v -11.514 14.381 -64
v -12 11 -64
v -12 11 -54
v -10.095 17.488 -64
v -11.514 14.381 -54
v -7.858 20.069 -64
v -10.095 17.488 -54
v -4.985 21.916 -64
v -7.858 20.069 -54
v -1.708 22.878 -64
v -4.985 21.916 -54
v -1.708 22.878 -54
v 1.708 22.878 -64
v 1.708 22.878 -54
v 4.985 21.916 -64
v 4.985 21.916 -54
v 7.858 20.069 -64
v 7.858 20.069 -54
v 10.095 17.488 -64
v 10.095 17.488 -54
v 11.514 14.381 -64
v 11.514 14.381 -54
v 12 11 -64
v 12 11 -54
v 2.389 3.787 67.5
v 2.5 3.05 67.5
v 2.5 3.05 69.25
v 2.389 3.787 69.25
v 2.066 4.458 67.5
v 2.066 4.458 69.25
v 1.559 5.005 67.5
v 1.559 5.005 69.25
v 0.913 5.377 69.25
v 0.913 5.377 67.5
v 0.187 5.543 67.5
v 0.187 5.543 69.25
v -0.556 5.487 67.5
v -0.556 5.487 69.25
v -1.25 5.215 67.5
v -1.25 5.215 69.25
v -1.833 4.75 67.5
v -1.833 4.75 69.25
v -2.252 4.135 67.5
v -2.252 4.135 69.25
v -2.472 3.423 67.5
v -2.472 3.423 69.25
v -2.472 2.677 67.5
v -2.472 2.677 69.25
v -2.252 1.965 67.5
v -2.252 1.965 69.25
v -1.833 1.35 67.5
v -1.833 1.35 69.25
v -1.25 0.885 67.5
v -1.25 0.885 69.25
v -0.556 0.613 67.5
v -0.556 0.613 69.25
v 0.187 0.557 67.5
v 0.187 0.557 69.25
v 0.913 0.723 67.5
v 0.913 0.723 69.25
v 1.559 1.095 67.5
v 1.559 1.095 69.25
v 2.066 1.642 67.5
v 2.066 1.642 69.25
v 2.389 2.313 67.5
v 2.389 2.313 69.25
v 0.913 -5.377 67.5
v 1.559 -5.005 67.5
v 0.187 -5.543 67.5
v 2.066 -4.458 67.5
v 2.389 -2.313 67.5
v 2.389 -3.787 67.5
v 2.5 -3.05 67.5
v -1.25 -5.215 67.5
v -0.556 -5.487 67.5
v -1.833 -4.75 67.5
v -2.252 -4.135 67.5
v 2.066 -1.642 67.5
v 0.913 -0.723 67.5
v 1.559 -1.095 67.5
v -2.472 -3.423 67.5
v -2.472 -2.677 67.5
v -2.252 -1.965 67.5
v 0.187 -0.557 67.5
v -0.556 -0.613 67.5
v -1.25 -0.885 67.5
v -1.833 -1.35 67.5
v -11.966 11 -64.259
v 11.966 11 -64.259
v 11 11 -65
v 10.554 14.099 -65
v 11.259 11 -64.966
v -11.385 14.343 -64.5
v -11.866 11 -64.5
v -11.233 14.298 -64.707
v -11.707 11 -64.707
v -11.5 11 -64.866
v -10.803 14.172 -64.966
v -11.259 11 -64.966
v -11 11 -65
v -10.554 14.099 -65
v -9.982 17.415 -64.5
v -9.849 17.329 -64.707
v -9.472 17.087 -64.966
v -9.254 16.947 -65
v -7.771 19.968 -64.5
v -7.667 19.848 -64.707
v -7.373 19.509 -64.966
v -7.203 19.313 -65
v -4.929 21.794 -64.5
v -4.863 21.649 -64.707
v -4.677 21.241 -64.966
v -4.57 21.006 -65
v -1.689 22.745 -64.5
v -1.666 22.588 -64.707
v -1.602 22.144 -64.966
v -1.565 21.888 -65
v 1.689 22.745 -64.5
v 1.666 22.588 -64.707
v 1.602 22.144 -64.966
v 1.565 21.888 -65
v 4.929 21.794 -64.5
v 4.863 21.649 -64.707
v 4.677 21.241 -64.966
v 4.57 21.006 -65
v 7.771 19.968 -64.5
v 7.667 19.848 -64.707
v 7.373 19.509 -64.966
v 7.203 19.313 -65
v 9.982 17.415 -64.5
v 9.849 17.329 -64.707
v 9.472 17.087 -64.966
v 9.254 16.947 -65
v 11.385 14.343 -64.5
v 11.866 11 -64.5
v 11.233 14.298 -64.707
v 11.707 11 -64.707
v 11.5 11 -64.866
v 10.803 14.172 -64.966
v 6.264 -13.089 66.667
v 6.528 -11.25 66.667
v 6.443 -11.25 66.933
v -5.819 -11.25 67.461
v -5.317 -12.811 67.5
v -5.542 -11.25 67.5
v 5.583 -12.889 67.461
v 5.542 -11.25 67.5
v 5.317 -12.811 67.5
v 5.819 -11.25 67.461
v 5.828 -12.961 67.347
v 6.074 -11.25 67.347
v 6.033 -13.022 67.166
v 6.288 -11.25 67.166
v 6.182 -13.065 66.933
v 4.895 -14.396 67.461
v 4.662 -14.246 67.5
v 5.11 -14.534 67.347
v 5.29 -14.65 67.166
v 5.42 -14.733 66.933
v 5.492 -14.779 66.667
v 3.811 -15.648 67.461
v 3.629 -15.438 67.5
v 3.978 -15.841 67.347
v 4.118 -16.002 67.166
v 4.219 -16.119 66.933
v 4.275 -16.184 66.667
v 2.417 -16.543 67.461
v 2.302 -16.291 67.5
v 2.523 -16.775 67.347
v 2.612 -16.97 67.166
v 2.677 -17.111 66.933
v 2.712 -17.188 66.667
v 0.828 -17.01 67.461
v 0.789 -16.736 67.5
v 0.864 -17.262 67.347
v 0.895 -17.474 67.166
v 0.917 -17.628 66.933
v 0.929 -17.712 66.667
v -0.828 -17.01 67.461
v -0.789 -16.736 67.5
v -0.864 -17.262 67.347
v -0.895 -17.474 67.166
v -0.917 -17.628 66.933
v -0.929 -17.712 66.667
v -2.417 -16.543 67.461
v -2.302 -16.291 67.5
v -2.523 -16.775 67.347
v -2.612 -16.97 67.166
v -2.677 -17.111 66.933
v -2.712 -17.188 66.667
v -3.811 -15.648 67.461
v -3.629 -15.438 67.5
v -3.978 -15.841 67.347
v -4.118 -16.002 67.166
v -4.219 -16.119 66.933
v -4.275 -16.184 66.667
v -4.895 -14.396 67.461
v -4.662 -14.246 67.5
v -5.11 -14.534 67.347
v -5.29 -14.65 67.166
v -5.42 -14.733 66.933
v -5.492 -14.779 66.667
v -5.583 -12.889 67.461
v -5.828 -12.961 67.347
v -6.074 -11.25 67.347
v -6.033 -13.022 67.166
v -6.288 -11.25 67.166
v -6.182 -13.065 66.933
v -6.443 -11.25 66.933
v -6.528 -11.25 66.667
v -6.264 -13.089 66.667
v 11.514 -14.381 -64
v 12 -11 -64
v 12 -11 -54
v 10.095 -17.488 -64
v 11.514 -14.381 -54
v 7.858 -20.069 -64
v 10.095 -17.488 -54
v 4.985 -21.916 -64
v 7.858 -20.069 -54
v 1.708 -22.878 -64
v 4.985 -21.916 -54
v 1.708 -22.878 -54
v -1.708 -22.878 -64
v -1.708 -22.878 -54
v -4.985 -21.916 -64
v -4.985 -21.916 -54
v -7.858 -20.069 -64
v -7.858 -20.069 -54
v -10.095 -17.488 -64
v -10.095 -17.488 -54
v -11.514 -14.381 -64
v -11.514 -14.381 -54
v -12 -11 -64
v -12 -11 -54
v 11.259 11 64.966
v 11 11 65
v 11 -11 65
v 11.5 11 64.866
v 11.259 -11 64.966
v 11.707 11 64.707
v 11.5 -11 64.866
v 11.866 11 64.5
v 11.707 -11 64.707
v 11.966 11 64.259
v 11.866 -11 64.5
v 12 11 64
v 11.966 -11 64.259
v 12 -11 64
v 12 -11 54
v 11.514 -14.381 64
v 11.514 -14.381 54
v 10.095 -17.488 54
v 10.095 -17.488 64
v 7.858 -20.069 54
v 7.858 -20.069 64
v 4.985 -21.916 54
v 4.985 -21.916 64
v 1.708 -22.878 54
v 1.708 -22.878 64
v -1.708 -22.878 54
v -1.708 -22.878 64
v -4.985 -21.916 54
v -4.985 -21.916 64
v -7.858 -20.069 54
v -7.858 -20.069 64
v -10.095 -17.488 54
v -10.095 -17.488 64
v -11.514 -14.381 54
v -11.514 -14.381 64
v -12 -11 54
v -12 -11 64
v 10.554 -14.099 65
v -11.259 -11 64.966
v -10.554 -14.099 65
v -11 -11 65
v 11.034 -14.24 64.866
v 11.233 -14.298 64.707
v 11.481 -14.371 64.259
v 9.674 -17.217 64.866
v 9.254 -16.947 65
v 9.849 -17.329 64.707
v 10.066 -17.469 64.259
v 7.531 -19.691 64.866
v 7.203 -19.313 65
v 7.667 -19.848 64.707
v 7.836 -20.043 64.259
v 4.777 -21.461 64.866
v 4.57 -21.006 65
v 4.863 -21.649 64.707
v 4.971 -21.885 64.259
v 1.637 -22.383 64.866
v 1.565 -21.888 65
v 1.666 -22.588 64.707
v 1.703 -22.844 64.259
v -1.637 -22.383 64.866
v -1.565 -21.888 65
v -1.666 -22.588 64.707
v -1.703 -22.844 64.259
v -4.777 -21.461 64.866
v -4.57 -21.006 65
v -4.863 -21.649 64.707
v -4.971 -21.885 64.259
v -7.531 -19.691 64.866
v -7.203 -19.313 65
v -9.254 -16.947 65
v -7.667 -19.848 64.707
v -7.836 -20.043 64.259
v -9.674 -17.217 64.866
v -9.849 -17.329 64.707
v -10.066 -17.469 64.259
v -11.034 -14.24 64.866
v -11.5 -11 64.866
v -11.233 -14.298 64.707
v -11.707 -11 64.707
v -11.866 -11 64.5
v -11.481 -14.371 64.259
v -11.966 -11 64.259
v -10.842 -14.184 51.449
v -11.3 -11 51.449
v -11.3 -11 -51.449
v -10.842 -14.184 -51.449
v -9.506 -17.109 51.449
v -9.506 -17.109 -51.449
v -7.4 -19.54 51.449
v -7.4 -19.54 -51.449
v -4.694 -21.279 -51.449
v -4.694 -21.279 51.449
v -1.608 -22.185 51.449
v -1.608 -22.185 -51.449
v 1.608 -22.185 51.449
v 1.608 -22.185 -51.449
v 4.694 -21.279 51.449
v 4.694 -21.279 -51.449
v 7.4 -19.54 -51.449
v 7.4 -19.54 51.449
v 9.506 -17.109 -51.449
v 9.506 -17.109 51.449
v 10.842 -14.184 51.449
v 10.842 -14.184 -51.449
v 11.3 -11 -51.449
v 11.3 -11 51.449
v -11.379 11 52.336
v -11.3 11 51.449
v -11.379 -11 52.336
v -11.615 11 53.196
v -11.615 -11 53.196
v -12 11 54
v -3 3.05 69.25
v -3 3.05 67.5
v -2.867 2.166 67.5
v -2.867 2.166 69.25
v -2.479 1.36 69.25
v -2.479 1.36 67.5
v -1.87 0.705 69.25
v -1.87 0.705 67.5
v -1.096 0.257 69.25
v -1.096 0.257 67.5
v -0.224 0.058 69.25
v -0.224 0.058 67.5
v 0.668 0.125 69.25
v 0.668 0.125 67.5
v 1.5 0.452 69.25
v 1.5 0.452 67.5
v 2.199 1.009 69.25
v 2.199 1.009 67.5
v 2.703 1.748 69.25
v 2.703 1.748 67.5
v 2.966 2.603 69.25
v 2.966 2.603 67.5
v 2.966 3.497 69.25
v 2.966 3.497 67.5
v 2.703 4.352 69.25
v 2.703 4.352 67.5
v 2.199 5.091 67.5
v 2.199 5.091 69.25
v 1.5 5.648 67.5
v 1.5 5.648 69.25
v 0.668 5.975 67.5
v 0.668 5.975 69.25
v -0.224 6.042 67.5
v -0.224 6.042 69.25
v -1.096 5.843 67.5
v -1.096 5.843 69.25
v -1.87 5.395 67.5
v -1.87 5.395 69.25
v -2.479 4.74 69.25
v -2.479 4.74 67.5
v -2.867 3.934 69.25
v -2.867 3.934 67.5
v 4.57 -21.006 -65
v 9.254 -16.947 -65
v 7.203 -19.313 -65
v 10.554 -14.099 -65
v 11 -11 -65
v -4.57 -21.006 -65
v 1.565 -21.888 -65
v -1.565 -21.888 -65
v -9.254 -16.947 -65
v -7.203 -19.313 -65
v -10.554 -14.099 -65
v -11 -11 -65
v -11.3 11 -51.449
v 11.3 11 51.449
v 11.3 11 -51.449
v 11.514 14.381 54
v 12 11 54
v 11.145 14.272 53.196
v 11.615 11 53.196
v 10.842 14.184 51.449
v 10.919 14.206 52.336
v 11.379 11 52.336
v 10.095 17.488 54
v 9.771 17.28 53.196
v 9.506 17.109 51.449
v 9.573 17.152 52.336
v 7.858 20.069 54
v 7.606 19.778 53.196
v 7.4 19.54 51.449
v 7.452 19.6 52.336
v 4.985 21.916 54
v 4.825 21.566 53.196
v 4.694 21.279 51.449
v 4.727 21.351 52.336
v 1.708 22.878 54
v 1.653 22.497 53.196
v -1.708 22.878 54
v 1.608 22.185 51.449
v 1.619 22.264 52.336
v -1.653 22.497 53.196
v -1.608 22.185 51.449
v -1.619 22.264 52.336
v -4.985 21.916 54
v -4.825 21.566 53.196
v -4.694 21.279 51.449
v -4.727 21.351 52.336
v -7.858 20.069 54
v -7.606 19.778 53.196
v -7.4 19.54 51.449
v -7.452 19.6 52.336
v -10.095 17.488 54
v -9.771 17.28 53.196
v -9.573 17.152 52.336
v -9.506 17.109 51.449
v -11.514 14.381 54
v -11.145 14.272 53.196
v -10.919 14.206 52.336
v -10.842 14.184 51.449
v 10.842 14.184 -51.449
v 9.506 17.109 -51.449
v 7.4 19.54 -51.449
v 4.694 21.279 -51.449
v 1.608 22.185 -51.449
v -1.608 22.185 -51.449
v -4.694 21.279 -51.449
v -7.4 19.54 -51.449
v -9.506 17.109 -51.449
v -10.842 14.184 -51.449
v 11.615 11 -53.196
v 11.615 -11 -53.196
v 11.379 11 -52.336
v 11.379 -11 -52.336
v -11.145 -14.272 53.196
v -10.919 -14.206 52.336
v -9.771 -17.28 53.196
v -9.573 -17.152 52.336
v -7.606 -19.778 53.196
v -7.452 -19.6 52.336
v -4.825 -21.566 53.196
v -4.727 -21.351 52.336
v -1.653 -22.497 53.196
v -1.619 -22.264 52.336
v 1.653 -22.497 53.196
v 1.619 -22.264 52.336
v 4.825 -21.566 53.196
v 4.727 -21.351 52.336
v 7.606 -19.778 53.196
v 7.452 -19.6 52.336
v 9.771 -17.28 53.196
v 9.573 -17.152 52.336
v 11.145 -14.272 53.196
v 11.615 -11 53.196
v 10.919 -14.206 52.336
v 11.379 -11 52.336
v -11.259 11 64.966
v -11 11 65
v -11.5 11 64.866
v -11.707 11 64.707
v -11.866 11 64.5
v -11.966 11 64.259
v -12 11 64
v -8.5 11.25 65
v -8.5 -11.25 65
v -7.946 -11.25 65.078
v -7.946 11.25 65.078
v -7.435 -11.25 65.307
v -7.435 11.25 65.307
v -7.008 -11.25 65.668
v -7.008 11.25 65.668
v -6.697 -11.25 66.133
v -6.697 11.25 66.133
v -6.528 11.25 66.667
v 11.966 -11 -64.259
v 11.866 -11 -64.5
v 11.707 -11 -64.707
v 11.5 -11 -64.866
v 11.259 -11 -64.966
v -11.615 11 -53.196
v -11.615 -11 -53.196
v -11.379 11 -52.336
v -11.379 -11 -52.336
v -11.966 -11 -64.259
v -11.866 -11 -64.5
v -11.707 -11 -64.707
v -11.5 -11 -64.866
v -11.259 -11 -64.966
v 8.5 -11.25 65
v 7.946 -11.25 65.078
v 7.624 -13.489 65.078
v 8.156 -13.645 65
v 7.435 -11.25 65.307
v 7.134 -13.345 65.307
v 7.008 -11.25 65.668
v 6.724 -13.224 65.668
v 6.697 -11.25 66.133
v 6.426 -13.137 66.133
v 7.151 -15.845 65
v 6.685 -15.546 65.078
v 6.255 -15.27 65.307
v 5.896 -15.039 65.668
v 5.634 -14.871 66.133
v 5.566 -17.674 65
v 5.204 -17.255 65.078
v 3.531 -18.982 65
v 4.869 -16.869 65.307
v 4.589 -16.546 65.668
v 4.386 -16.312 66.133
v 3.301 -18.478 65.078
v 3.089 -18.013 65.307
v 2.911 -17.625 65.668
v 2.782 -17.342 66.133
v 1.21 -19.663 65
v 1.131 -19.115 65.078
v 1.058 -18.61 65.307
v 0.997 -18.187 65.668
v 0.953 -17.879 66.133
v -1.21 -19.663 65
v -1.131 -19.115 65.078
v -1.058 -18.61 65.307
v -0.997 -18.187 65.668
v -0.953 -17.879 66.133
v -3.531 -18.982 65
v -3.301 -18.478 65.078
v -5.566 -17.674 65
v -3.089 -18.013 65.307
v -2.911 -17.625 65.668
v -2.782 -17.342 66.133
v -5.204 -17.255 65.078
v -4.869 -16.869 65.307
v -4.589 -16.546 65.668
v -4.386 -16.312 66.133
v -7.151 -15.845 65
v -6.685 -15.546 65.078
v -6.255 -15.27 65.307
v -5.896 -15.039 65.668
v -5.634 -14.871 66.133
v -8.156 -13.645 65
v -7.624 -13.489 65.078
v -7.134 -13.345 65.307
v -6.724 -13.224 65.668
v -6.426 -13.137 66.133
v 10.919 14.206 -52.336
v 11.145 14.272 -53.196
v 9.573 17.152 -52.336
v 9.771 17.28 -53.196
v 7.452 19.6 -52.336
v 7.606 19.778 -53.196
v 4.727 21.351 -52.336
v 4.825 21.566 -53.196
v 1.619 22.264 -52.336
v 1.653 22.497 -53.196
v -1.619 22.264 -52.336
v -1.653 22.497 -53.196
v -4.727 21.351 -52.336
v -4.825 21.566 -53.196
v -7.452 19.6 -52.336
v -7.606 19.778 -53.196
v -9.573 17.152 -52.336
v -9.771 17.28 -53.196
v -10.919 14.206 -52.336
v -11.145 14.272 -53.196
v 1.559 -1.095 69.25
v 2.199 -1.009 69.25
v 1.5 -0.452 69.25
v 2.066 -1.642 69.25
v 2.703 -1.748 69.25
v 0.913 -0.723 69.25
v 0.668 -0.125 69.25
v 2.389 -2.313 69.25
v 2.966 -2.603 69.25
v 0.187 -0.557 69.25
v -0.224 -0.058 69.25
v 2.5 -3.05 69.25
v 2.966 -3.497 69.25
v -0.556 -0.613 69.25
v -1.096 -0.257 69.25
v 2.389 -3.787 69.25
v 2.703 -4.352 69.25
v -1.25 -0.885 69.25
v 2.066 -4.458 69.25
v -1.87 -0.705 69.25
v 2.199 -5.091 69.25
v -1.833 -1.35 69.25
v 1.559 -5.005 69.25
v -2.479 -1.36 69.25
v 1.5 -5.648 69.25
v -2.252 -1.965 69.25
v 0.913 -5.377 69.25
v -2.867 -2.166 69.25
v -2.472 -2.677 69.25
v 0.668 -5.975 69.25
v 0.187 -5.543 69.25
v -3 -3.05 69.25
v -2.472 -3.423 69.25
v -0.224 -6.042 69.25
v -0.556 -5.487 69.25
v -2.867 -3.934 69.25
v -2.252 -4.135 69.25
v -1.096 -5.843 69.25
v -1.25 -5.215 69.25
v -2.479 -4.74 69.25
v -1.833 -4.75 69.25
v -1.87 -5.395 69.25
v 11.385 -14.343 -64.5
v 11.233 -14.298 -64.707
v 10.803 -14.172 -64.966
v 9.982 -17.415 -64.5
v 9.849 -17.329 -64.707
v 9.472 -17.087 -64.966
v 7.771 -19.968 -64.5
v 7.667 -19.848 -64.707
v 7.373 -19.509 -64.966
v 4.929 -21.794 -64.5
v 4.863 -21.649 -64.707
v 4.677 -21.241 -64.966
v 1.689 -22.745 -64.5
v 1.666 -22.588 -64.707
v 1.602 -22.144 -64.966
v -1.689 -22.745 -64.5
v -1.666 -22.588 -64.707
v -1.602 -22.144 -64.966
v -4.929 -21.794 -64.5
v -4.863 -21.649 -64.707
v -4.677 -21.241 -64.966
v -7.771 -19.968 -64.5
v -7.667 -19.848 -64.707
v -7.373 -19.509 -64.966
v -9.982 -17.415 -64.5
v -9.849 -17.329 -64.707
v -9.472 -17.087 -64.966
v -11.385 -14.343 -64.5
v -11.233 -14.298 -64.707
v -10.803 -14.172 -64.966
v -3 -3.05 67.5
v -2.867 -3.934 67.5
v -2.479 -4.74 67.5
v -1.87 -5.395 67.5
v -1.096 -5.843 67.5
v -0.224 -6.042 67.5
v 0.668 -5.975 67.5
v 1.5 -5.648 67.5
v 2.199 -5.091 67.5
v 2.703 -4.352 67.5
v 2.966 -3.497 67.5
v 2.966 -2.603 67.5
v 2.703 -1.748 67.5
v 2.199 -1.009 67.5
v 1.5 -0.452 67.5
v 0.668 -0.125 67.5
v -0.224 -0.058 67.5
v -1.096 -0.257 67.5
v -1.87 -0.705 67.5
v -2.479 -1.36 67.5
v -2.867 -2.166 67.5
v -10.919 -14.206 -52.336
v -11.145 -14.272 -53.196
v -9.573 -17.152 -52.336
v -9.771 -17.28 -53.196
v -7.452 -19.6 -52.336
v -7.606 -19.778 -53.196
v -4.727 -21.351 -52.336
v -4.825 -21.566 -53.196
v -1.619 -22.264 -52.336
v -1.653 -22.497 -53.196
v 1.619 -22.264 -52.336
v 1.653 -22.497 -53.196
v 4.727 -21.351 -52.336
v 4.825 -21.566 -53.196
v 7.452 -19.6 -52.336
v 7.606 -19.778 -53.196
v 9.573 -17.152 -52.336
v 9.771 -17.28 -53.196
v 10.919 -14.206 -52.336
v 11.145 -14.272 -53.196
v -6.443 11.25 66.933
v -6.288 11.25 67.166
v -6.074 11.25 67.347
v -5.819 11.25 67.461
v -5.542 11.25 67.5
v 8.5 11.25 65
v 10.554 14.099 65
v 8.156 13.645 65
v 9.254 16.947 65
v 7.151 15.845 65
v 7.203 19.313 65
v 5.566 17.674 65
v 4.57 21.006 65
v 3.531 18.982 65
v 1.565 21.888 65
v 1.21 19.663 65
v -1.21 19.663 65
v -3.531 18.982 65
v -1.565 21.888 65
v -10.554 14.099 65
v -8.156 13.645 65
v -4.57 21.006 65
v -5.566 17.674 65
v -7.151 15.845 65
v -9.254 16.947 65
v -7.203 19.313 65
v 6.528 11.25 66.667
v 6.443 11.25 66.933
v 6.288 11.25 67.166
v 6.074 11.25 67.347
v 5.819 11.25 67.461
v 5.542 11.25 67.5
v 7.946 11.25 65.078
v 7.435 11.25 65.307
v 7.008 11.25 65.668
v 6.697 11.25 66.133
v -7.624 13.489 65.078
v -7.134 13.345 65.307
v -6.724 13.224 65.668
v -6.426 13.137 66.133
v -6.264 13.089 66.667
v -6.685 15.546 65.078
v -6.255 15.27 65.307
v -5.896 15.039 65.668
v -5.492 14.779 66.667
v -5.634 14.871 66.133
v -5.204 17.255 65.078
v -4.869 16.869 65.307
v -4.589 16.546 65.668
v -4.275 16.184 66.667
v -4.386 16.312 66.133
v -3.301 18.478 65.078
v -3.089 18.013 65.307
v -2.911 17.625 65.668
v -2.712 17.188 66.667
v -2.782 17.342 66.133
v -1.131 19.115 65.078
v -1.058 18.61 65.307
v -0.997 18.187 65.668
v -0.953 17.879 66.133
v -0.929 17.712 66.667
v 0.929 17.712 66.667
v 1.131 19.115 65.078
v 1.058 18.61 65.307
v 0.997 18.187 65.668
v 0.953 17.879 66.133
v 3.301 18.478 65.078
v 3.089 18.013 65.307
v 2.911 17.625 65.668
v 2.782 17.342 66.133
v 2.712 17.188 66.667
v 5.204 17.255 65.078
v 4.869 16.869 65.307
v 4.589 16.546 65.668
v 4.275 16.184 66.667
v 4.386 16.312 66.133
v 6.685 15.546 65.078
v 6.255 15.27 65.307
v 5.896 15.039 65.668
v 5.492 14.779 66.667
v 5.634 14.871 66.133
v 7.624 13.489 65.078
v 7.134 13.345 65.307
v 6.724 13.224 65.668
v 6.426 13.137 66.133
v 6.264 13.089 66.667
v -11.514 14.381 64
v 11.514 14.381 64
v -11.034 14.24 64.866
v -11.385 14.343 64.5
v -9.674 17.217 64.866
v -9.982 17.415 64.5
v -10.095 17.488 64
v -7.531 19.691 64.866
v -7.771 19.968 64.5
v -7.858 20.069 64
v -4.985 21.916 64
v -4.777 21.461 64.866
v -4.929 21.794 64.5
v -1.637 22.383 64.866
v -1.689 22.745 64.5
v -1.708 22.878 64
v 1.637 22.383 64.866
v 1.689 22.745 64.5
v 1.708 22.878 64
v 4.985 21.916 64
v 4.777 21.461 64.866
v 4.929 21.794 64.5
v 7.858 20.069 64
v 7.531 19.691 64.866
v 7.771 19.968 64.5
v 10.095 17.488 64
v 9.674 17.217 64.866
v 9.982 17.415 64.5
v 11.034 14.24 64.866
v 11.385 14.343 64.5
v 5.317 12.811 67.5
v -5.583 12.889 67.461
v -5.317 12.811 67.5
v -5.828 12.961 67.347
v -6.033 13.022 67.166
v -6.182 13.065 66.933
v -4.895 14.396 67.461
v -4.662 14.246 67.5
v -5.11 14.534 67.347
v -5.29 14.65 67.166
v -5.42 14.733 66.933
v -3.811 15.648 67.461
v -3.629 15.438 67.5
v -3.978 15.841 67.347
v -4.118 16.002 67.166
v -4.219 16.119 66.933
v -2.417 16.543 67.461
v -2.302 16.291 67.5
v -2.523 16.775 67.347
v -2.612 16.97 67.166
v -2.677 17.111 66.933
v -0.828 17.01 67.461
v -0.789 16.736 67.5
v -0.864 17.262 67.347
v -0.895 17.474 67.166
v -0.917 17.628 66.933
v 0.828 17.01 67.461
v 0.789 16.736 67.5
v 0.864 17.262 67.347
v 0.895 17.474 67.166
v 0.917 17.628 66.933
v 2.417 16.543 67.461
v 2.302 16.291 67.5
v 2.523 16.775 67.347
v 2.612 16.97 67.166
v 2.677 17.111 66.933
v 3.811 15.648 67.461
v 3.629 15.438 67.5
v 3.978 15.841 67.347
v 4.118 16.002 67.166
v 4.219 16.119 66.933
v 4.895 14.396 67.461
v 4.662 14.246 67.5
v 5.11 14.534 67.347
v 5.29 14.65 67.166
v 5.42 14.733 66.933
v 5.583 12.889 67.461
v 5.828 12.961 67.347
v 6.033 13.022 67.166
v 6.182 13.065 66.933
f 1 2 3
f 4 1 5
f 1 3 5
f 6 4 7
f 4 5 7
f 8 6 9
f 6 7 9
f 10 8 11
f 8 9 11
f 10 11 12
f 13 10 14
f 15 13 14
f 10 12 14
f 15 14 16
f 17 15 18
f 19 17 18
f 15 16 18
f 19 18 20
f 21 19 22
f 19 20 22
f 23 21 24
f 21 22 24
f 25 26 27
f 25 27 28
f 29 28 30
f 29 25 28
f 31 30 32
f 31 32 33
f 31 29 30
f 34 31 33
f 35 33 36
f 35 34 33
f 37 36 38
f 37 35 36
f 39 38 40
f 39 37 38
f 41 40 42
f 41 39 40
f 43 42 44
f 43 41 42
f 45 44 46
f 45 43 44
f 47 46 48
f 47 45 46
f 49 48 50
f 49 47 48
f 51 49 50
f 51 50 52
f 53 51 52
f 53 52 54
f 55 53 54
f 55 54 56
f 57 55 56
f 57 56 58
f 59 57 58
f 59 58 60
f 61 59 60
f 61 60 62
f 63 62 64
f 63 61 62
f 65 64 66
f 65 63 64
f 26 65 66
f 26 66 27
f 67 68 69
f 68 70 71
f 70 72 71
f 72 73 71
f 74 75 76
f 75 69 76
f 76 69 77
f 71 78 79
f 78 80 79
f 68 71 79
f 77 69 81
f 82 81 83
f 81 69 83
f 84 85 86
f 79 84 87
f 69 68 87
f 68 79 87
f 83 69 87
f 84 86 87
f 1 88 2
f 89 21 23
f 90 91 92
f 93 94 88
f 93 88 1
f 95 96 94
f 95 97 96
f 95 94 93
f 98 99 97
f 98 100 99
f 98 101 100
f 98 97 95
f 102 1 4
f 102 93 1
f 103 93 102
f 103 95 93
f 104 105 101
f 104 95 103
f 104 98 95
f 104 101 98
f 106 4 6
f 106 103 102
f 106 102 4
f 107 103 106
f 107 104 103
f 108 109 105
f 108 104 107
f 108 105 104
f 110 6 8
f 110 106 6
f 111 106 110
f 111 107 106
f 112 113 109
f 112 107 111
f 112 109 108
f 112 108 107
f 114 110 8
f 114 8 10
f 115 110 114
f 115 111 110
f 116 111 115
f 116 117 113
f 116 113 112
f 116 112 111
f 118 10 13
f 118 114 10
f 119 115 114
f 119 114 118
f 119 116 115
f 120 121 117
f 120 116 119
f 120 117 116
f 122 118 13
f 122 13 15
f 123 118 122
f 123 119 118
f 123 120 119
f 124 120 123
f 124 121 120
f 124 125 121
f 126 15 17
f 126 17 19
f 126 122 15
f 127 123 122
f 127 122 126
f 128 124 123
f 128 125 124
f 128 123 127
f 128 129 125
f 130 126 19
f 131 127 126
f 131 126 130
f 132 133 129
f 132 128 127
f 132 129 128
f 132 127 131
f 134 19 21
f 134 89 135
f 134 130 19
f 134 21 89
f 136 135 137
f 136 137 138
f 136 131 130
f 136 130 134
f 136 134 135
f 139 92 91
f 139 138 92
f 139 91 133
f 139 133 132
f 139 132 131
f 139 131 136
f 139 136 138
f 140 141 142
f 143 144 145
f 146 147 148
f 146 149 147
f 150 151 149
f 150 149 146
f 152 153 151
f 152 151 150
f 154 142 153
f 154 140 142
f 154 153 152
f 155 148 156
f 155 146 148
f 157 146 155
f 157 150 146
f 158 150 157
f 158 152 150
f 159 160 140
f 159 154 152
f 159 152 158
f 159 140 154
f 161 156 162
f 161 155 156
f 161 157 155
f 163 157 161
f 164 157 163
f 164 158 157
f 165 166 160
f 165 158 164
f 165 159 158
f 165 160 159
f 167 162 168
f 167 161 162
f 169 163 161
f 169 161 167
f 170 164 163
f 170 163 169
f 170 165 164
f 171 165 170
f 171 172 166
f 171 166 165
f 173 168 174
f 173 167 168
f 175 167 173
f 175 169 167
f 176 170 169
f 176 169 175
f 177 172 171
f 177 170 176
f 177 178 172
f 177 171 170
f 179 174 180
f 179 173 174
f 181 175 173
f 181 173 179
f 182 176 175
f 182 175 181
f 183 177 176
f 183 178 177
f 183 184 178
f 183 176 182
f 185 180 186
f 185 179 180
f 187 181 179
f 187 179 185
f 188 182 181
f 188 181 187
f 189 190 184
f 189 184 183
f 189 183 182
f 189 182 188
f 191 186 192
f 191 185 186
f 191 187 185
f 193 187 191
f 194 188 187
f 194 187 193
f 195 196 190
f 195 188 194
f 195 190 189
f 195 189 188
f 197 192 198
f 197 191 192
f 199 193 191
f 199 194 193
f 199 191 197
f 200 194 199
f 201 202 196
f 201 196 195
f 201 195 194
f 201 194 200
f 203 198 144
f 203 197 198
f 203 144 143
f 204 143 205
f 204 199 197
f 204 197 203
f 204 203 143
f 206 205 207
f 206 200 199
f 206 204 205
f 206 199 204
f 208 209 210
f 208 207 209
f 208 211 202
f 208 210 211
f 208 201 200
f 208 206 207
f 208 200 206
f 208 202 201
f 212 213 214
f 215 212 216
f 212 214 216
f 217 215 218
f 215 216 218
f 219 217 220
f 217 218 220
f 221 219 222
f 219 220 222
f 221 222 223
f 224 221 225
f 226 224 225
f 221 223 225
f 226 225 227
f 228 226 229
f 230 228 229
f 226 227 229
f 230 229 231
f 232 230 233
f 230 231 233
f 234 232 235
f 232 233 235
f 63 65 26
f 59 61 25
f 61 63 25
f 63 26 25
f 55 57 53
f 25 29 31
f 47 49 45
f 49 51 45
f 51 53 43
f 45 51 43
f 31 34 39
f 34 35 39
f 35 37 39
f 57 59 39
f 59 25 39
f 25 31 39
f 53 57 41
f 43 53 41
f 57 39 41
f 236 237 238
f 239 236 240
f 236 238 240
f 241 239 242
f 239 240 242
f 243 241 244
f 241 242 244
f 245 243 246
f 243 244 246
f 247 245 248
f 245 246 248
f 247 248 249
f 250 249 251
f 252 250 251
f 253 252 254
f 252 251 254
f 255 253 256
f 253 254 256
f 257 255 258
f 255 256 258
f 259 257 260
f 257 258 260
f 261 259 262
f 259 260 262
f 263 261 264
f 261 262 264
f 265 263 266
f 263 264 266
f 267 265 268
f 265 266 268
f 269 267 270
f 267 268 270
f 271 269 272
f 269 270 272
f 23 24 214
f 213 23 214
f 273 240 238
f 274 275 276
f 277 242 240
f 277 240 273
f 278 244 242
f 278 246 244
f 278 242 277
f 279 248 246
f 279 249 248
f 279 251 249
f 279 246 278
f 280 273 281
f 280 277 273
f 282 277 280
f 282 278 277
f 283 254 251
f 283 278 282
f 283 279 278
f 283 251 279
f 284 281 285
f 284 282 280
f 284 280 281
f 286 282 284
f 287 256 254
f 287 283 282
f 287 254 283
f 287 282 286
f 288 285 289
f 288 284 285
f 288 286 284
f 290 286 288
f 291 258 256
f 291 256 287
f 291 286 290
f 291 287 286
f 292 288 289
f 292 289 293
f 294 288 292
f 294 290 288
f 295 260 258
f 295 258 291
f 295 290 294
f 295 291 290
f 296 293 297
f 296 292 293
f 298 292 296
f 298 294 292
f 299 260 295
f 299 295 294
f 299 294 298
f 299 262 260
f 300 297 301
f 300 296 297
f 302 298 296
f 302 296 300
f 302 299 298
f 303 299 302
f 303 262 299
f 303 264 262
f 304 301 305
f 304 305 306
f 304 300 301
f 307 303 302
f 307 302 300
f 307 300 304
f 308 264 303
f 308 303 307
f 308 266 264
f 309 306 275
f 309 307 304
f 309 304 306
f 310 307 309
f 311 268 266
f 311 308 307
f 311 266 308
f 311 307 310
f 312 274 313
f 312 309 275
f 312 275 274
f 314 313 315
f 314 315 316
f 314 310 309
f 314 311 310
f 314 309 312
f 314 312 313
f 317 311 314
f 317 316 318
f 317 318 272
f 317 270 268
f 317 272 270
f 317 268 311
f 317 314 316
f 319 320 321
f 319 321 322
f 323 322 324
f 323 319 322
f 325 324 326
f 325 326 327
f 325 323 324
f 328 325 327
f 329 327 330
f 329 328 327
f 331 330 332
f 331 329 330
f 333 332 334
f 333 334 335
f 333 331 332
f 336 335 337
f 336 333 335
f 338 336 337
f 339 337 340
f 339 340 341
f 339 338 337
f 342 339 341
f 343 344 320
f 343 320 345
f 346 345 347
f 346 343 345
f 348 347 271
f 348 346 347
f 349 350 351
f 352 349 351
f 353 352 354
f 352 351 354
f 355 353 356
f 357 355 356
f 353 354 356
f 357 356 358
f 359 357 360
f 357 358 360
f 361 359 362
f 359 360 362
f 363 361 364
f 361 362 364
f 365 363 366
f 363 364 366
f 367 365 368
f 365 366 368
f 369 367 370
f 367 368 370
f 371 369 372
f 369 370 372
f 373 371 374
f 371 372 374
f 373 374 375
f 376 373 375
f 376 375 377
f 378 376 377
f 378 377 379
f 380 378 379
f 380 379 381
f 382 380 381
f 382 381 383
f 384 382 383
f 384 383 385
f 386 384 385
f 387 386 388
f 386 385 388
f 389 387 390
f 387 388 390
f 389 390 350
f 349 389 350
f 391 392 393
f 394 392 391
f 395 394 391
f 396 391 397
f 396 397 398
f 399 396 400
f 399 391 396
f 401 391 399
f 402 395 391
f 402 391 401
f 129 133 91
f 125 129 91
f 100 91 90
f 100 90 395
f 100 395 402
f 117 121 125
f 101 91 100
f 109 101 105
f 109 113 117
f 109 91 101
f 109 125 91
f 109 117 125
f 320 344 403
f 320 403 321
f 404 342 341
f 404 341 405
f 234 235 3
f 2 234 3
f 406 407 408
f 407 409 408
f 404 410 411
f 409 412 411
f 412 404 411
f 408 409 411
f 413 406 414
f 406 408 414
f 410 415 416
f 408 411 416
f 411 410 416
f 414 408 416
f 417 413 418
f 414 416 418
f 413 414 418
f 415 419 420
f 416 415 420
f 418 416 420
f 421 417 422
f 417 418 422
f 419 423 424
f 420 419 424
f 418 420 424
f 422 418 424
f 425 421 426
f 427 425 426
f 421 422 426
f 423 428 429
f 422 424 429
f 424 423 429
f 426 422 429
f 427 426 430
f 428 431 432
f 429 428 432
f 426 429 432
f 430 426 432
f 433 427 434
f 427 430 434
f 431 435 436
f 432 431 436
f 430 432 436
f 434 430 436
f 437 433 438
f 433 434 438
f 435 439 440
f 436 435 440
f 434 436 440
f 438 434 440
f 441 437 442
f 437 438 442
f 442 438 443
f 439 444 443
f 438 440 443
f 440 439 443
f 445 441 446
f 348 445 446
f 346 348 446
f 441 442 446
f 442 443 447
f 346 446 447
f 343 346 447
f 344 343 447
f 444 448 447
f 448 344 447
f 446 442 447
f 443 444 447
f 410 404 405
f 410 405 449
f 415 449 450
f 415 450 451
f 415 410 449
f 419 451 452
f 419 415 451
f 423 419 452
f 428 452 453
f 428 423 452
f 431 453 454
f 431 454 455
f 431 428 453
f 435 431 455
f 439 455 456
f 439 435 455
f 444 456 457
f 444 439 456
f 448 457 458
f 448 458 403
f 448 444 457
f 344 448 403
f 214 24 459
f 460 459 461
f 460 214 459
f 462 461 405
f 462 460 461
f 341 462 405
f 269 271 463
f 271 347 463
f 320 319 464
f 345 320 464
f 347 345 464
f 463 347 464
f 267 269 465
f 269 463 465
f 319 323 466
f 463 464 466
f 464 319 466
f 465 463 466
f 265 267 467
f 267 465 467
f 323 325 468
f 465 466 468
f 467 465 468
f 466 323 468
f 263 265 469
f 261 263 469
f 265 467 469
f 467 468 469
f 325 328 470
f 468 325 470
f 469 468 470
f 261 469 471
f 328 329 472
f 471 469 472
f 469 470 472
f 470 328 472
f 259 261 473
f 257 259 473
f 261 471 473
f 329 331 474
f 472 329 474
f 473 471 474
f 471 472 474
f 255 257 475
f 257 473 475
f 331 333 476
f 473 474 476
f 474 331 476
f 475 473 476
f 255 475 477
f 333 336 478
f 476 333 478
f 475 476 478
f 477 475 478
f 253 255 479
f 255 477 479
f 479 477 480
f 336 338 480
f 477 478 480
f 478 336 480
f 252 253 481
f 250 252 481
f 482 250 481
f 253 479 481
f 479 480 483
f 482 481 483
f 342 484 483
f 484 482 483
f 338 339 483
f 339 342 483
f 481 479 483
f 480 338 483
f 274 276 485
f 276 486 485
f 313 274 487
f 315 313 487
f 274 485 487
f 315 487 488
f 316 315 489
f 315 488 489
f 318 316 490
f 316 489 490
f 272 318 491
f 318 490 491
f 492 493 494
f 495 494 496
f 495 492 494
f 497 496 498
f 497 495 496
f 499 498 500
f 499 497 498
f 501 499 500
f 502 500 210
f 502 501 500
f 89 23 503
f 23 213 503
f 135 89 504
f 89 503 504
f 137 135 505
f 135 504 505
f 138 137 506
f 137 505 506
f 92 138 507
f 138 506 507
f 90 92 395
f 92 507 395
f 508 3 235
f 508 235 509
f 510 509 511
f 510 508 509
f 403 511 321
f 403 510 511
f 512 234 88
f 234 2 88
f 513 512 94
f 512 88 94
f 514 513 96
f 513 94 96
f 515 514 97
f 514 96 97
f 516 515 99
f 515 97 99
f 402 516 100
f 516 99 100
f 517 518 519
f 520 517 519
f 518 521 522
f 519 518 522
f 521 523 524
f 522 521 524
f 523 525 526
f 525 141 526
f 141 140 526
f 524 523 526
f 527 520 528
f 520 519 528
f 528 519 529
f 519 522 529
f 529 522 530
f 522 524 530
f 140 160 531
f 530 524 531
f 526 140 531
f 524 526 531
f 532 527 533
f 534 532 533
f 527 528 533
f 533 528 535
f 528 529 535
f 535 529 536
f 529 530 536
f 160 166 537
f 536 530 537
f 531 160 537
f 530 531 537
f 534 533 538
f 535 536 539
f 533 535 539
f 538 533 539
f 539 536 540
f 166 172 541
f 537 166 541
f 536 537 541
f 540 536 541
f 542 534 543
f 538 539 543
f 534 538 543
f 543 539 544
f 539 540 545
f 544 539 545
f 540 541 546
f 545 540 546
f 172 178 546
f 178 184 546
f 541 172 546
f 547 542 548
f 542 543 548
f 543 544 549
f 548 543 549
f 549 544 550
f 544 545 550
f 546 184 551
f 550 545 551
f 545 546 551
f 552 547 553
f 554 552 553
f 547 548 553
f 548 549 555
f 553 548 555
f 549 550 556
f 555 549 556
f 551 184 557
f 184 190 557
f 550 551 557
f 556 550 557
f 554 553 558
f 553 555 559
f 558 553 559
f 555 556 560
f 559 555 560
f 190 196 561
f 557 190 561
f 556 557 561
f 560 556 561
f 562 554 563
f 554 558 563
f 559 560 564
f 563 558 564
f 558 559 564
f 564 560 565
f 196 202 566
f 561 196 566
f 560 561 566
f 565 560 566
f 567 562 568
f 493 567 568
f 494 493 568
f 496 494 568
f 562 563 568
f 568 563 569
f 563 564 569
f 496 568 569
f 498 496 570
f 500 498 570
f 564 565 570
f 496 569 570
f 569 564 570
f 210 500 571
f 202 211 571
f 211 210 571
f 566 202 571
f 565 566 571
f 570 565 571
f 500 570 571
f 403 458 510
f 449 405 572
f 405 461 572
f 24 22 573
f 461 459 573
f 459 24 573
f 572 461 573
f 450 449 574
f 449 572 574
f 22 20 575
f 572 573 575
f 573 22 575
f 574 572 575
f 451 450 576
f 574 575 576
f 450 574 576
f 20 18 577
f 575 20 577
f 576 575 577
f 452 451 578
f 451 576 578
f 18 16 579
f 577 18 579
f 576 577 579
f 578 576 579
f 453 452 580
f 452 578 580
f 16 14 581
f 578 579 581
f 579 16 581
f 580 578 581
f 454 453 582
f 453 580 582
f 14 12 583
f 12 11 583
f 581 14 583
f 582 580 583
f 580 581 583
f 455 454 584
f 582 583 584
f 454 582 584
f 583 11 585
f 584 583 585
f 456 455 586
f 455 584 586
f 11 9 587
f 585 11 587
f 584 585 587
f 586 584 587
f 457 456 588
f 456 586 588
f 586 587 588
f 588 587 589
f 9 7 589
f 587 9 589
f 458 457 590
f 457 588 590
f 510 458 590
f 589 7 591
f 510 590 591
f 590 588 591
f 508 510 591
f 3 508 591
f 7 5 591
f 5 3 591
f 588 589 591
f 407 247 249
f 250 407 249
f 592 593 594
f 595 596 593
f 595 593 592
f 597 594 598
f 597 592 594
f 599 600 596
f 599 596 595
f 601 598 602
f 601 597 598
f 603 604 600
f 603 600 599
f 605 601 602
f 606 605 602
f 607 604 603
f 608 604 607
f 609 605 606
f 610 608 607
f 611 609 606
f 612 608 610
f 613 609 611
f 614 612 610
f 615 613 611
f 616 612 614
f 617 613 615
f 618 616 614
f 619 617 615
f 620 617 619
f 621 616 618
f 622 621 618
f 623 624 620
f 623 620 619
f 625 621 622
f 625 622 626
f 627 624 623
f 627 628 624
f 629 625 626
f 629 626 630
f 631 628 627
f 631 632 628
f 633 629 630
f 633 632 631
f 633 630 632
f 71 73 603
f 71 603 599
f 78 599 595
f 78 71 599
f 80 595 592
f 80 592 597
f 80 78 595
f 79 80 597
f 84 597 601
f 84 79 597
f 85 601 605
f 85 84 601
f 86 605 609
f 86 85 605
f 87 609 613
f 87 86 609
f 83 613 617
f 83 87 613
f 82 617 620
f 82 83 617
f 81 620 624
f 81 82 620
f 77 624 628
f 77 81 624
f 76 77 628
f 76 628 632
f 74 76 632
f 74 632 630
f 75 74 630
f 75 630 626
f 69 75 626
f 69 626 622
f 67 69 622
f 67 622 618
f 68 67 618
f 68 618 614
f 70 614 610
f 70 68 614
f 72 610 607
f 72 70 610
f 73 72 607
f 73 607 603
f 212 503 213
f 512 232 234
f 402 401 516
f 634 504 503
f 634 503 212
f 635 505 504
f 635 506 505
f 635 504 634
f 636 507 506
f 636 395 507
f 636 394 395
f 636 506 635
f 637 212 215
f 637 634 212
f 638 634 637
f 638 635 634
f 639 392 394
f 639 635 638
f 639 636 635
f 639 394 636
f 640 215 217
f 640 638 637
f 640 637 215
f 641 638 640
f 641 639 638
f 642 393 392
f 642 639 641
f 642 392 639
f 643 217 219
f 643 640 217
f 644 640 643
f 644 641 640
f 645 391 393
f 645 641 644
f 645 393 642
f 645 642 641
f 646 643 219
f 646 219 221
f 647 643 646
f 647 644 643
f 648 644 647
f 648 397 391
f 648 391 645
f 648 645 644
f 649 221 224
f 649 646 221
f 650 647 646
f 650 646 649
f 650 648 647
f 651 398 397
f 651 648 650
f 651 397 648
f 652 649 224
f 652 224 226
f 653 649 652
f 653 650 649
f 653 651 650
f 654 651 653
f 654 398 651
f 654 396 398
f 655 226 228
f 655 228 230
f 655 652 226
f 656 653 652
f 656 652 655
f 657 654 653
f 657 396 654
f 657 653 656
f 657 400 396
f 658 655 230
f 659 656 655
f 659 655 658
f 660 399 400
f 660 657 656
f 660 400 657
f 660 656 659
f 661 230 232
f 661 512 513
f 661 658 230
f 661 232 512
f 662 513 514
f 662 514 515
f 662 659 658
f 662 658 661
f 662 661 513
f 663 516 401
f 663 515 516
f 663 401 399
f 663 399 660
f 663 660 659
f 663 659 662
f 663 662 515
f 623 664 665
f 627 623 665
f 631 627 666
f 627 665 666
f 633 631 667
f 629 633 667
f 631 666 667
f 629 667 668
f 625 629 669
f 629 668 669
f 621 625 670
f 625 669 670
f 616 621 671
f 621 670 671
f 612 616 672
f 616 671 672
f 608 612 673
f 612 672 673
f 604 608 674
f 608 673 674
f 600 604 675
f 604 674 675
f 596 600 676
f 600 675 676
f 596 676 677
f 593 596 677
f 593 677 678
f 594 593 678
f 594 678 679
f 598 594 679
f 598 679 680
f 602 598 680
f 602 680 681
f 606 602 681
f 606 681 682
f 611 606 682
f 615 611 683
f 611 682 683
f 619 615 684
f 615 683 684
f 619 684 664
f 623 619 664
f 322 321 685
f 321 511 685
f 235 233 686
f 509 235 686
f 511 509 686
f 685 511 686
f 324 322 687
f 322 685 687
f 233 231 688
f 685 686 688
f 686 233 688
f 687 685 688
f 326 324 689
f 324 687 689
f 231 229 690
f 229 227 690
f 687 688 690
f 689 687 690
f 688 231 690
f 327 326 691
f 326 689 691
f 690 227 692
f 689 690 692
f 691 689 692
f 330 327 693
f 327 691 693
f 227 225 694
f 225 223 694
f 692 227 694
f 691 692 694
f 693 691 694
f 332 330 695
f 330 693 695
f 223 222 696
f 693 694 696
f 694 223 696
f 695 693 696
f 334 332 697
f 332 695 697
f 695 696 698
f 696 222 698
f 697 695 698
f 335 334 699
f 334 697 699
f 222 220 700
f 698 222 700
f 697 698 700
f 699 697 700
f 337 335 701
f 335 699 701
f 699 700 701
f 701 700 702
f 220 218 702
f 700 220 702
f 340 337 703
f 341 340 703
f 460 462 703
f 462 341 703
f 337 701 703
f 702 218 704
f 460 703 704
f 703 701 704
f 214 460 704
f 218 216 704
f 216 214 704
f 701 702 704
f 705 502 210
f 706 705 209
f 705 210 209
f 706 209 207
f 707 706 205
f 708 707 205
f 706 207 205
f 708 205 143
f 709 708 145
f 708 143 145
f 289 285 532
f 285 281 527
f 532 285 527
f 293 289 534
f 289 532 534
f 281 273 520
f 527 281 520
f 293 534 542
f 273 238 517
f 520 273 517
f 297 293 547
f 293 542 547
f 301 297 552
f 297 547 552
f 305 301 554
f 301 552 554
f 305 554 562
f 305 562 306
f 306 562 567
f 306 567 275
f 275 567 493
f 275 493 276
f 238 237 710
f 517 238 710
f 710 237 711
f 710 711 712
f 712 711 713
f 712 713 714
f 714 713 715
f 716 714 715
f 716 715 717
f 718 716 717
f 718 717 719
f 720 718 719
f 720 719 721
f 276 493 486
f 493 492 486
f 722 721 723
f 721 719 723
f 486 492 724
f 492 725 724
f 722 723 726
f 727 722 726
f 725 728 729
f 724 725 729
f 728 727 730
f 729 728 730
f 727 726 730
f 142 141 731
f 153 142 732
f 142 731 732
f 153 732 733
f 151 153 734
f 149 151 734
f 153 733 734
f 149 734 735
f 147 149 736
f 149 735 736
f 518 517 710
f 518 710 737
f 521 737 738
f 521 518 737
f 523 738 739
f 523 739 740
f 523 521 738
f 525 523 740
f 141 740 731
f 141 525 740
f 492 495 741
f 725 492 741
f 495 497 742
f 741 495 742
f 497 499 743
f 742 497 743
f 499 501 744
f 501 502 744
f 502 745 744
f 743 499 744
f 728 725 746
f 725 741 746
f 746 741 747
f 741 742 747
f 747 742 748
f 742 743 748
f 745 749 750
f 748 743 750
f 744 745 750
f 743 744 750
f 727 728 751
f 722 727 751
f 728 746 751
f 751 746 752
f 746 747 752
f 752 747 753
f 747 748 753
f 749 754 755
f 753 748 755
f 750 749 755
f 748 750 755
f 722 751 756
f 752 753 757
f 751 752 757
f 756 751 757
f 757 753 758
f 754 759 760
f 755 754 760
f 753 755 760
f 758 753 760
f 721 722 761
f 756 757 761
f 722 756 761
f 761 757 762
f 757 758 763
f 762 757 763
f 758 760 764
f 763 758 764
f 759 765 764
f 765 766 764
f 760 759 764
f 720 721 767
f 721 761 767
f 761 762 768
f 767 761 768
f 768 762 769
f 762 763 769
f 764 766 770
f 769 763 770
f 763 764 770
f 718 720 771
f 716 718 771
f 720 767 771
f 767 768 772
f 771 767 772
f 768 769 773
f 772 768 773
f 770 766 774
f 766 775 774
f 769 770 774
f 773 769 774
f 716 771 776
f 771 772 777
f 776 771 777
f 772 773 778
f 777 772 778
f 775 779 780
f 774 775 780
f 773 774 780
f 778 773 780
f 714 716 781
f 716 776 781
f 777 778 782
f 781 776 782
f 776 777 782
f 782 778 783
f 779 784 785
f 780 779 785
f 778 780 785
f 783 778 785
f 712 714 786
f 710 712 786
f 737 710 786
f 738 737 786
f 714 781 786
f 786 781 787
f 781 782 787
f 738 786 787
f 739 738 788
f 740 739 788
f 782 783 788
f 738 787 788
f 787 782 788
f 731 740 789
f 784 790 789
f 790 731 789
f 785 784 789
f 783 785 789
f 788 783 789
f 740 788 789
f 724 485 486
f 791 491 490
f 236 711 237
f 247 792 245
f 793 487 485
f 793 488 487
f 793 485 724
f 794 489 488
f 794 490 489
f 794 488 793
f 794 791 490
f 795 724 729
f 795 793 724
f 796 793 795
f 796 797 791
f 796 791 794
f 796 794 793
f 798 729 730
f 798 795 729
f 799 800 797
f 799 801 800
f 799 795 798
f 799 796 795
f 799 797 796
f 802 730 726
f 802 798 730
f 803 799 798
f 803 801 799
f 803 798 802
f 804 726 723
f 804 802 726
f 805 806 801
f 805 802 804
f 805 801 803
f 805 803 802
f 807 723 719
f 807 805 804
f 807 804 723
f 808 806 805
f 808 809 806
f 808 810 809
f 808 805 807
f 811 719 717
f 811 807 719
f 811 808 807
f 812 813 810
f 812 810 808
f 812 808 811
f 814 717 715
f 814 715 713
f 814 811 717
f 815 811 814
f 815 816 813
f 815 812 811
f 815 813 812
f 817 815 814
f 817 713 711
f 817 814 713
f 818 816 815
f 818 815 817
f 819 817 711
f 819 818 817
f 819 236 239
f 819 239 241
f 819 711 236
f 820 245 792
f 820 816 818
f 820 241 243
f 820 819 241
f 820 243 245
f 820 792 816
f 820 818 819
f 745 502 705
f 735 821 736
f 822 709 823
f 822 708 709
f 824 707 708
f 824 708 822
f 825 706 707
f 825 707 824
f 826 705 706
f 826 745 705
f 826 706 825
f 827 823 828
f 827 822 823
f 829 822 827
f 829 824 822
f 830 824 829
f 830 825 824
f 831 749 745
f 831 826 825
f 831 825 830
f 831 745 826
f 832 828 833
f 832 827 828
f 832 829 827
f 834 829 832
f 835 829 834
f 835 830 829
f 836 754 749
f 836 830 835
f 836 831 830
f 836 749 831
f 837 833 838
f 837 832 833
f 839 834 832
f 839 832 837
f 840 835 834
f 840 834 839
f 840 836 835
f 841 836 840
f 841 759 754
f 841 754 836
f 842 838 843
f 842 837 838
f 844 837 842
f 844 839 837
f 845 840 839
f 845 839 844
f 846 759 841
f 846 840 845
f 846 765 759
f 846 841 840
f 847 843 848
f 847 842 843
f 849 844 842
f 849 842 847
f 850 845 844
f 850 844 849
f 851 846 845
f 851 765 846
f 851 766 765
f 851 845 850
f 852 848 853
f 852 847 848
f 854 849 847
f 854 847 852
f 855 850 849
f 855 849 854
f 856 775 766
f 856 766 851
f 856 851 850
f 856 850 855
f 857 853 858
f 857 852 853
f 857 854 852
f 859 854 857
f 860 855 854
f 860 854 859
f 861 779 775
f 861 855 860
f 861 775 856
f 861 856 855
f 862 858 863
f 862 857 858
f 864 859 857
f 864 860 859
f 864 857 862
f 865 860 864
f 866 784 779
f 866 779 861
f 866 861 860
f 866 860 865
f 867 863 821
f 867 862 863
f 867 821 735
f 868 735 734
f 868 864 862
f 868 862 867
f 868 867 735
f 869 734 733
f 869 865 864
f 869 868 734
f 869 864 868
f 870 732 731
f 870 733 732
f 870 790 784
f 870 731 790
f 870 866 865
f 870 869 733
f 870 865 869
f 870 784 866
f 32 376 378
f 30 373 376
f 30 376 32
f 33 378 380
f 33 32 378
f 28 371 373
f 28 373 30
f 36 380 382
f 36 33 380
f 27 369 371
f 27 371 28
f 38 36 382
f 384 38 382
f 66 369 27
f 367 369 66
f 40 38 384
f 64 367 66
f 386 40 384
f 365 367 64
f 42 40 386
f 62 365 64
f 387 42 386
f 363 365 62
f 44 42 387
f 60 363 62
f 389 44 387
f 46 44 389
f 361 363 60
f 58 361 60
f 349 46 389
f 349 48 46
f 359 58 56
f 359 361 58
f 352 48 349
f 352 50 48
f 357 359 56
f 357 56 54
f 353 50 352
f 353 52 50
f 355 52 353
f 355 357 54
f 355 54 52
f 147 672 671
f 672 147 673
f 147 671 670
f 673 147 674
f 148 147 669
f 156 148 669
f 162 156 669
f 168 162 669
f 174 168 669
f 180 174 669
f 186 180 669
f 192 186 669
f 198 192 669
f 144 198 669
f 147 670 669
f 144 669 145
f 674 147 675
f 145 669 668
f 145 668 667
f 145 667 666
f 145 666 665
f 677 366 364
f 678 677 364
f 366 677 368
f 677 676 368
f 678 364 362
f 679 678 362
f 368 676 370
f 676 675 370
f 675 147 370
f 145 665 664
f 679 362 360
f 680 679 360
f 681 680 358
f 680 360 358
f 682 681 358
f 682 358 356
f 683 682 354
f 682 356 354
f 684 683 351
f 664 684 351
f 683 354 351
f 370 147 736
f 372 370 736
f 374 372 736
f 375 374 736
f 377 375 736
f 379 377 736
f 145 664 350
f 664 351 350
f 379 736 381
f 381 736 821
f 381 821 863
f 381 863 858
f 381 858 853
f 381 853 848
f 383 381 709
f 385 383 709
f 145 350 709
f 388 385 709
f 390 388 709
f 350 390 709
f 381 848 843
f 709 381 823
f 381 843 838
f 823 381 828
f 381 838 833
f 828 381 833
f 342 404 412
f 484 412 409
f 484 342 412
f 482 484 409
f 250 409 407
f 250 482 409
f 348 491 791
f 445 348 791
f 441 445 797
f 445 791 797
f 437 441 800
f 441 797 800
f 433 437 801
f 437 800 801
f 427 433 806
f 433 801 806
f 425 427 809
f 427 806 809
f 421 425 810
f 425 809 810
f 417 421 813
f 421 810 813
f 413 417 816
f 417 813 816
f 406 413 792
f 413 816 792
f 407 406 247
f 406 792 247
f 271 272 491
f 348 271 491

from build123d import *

# Parameters (mm, degrees)
BOSS_EXTRUDE2_DEPTH = 65
CUT_EXTRUDE1_DEPTH  = 54
FILLET1_R           = 5
FILLET2_R           = 1
BOSS_EXTRUDE3_DEPTH = 2.5
FILLET4_R           = 2
FILLET5_R           = 1
SKETCH4_R           = 3
SKETCH4_R_2         = 2.5
BOSS_EXTRUDE8_DEPTH = 1.75


with BuildPart() as part:
    # Sketch1 → Boss-Extrude2 (new, symmetric)
    with BuildSketch(Plane.XY):
        with BuildLine():
            Line((-12, -11), (-12, 11))
            ThreePointArc((-12, 11), (0, 23), (12, 11))
            Line((12, 11), (12, -11))
            ThreePointArc((12, -11), (0, -23), (-12, -11))
        make_face()
    extrude(amount=BOSS_EXTRUDE2_DEPTH, both=True)

    # Sketch2 → Cut-Extrude1 (cut, symmetric)
    with BuildSketch(Plane.XY):
        with BuildLine():
            Line((15, 11), (15, -11))
            ThreePointArc((15, -11), (0, -26), (-15, -11))
            Line((-15, -11), (-15, 11))
            ThreePointArc((-15, 11), (0, 26), (15, 11))
        make_face()
        with BuildLine():
            Line((-11.3, 11), (-11.3, -11))
            ThreePointArc((-11.3, -11), (0, -22.3), (11.3, -11))
            Line((11.3, -11), (11.3, 11))
            ThreePointArc((11.3, 11), (0, 22.3), (-11.3, 11))
        make_face(mode=Mode.SUBTRACT)
    extrude(amount=CUT_EXTRUDE1_DEPTH, both=True, mode=Mode.SUBTRACT)

    # Fillet1
    # the kernel refuses this fillet: 5 mm, written as the material it adds along each edge
    with BuildSketch(Plane(origin=(0, 11, -54), x_dir=(1, 0, 0), z_dir=(0, -1, 0))) as fillet1_piece_1:
        with BuildLine():
            CenterArc((16.3, 2.551470164), FILLET1_R, 180, 30.683417109)
            Line((11.3, 2.551470164), (11.2, 2.551470164))
            Line((11.2, 2.551470164), (11.2, 0))
            Line((11.2, 0), (11.3, -0.1))
            ThreePointArc((11.3, -0.1), (11.65, -0.1), (11.914, -0.051029403))
            Line((11.914, -0.051029403), (12, 0))
        make_face()
    revolve(axis=Axis((0, 11, -54), (0, 0, 1)), revolution_arc=180)
    with BuildSketch(Plane(origin=(-11.3, 11, -54), x_dir=(-1, 0, 0), z_dir=(0, -1, 0)), Plane(origin=(11.3, -11, -54), x_dir=(1, 0, 0), z_dir=(0, 1, 0))) as fillet1_piece_2:
        with BuildLine():
            CenterArc((5, -2.551470164), FILLET1_R, 149.316582891, 30.683417109)
            Line((0, -2.551470164), (-0.1, -2.551470164))
            Line((-0.1, -2.551470164), (-0.1, 0))
            Line((-0.1, 0), (0, 0.1))
            ThreePointArc((0, 0.1), (0.35, 0.1), (0.614, 0.051029403))
            Line((0.614, 0.051029403), (0.7, 0))
        make_face()
    extrude(amount=22)
    with BuildSketch(Plane(origin=(0, -11, -54), x_dir=(-1, 0, 0), z_dir=(0, 1, 0))) as fillet1_piece_3:
        with BuildLine():
            CenterArc((16.3, 2.551470164), FILLET1_R, 180, 30.683417109)
            Line((11.3, 2.551470164), (11.2, 2.551470164))
            Line((11.2, 2.551470164), (11.2, 0))
            Line((11.2, 0), (11.3, -0.1))
            ThreePointArc((11.3, -0.1), (11.65, -0.1), (11.914, -0.051029403))
            Line((11.914, -0.051029403), (12, 0))
        make_face()
    revolve(axis=Axis((0, -11, -54), (0, 0, 1)), revolution_arc=180)
    with BuildSketch(Plane(origin=(0, 11, 54), x_dir=(1, 0, 0), z_dir=(0, -1, 0))) as fillet1_piece_4:
        with BuildLine():
            CenterArc((16.3, -2.551470164), FILLET1_R, 149.316582891, 30.683417109)
            Line((12, 0), (11.914, 0.051029403))
            ThreePointArc((11.914, 0.051029403), (11.65, 0.1), (11.3, 0.1))
            Line((11.3, 0.1), (11.2, 0))
            Line((11.2, 0), (11.2, -2.551470164))
            Line((11.2, -2.551470164), (11.3, -2.551470164))
        make_face()
    revolve(axis=Axis((0, 11, 54), (0, 0, 1)), revolution_arc=180)
    with BuildSketch(Plane(origin=(11.3, -11, 54), x_dir=(0, 0, -1), z_dir=(0, 1, 0)), Plane(origin=(-11.3, 11, 54), x_dir=(0, 0, -1), z_dir=(0, -1, 0))) as fillet1_piece_5:
        with BuildLine():
            CenterArc((2.551470164, -5), FILLET1_R, 90, 30.683417109)
            Line((0, -0.7), (-0.051029403, -0.614))
            ThreePointArc((-0.051029403, -0.614), (-0.1, -0.35), (-0.1, 0))
            Line((-0.1, 0), (0, 0.1))
            Line((0, 0.1), (2.551470164, 0.1))
            Line((2.551470164, 0.1), (2.551470164, 0))
        make_face()
    extrude(amount=22)
    with BuildSketch(Plane(origin=(0, -11, 54), x_dir=(-1, 0, 0), z_dir=(0, 1, 0))) as fillet1_piece_6:
        with BuildLine():
            CenterArc((16.3, -2.551470164), FILLET1_R, 149.316582891, 30.683417109)
            Line((12, 0), (11.914, 0.051029403))
            ThreePointArc((11.914, 0.051029403), (11.65, 0.1), (11.3, 0.1))
            Line((11.3, 0.1), (11.2, 0))
            Line((11.2, 0), (11.2, -2.551470164))
            Line((11.2, -2.551470164), (11.3, -2.551470164))
        make_face()
    revolve(axis=Axis((0, -11, 54), (0, 0, 1)), revolution_arc=180)

    # Fillet2
    fillet2_edges = [part.edges().sort_by_distance(p)[0] for p in [
        (0, 23, 65),
        (-12, 0, 65),
        (0, -23, 65),
        (-12, 0, -65),
        (0, 23, -65),
        (12, 0, -65),
        (0, -23, -65),
        (12, 0, 65),
    ]]
    fillet(fillet2_edges, radius=FILLET2_R)

    # Sketch3 → Boss-Extrude3 (add)
    with BuildSketch(Plane.XY.offset(65)):
        with BuildLine():
            Line((-6.5, -11.25), (-6.5, 11.25))
            ThreePointArc((-6.5, 11.25), (0, 17.75), (6.5, 11.25))
            Line((6.5, 11.25), (6.5, -11.25))
            ThreePointArc((6.5, -11.25), (0, -17.75), (-6.5, -11.25))
        make_face()
    extrude(amount=BOSS_EXTRUDE3_DEPTH)

    # Fillet4
    fillet4_edges = [part.edges().sort_by_distance(p)[0] for p in [
        (0, -17.75, 65),
        (6.5, 0, 65),
        (0, 17.75, 65),
        (-6.5, 0, 65),
    ]]
    fillet(fillet4_edges, radius=FILLET4_R)

    # Fillet5
    # the kernel refuses this fillet: 1 mm, written as the material it takes off along each edge
    with BuildSketch(Plane(origin=(-6.5, -11.25, 67.5), x_dir=(-0.03354919019221856, 0, -0.9994370674722076), z_dir=(0, 1, 0)), Plane(origin=(6.5, 11.25, 67.5), x_dir=(0.03354919019221963, 0, -0.9994370674722076), z_dir=(0, -1, 0))) as fillet5_piece_1:
        with BuildLine():
            CenterArc((0.967295605, -0.99104977), FILLET5_R, 97.671480447, 80.405931773)
            Line((-0.032141463, -0.95750058), (-0.132085169, -0.954145661))
            Line((-0.132085169, -0.954145661), (-0.099943707, 0.003354919))
            Line((-0.099943707, 0.003354919), (0.003354919, 0.099943707))
            ThreePointArc((0.003354919, 0.099943707), (0.503073453, 0.083169112), (0.820453418, 0.099104977))
            Line((0.820453418, 0.099104977), (0.833802708, 0))
        make_face()
    extrude(amount=22.5, mode=Mode.SUBTRACT)
    with BuildSketch(Plane(origin=(0, 11.25, 67.5), x_dir=(-1, 0, 0), z_dir=(0, -1, 0))) as fillet5_piece_2:
        with BuildLine():
            CenterArc((5.541960108, 1), FILLET5_R, 270, 80.405931773)
            Line((5.541960108, 0), (5.541960108, -0.1))
            Line((5.541960108, -0.1), (6.5, -0.1))
            Line((6.5, -0.1), (6.6, 0))
            ThreePointArc((6.6, 0), (6.6, 0.5), (6.626574735, 0.816666667))
            Line((6.626574735, 0.816666667), (6.527973406, 0.833333333))
        make_face()
    revolve(axis=Axis((0, 11.25, 67.5), (0, 0, -1)), revolution_arc=180, mode=Mode.SUBTRACT)
    with BuildSketch(Plane(origin=(0, -11.25, 67.5), x_dir=(1, 0, 0), z_dir=(0, 1, 0))) as fillet5_piece_3:
        with BuildLine():
            CenterArc((5.541960108, 1), FILLET5_R, 270, 80.405931773)
            Line((5.541960108, 0), (5.541960108, -0.1))
            Line((5.541960108, -0.1), (6.5, -0.1))
            Line((6.5, -0.1), (6.6, 0))
            ThreePointArc((6.6, 0), (6.6, 0.5), (6.626574735, 0.816666667))
            Line((6.626574735, 0.816666667), (6.527973406, 0.833333333))
        make_face()
    revolve(axis=Axis((0, -11.25, 67.5), (0, 0, -1)), revolution_arc=180, mode=Mode.SUBTRACT)

    # Sketch4 → Boss-Extrude8 (add)
    # profile 1 of 2: a face of its own
    with BuildSketch(Plane.XY.offset(67.5)):
        with Locations(Location((0, 3.05, 0), (0, 0, 180))):
            Circle(SKETCH4_R)
        with Locations((0, 3.05)):
            Circle(SKETCH4_R_2, mode=Mode.SUBTRACT)
    # profile 2 of 2: a face of its own
    with BuildSketch(Plane.XY.offset(67.5)):
        with Locations(Location((0, -3.05, 0), (0, 0, 180))):
            Circle(SKETCH4_R)
        with Locations((0, -3.05)):
            Circle(SKETCH4_R_2, mode=Mode.SUBTRACT)
    extrude(amount=BOSS_EXTRUDE8_DEPTH)


solid = part.part
